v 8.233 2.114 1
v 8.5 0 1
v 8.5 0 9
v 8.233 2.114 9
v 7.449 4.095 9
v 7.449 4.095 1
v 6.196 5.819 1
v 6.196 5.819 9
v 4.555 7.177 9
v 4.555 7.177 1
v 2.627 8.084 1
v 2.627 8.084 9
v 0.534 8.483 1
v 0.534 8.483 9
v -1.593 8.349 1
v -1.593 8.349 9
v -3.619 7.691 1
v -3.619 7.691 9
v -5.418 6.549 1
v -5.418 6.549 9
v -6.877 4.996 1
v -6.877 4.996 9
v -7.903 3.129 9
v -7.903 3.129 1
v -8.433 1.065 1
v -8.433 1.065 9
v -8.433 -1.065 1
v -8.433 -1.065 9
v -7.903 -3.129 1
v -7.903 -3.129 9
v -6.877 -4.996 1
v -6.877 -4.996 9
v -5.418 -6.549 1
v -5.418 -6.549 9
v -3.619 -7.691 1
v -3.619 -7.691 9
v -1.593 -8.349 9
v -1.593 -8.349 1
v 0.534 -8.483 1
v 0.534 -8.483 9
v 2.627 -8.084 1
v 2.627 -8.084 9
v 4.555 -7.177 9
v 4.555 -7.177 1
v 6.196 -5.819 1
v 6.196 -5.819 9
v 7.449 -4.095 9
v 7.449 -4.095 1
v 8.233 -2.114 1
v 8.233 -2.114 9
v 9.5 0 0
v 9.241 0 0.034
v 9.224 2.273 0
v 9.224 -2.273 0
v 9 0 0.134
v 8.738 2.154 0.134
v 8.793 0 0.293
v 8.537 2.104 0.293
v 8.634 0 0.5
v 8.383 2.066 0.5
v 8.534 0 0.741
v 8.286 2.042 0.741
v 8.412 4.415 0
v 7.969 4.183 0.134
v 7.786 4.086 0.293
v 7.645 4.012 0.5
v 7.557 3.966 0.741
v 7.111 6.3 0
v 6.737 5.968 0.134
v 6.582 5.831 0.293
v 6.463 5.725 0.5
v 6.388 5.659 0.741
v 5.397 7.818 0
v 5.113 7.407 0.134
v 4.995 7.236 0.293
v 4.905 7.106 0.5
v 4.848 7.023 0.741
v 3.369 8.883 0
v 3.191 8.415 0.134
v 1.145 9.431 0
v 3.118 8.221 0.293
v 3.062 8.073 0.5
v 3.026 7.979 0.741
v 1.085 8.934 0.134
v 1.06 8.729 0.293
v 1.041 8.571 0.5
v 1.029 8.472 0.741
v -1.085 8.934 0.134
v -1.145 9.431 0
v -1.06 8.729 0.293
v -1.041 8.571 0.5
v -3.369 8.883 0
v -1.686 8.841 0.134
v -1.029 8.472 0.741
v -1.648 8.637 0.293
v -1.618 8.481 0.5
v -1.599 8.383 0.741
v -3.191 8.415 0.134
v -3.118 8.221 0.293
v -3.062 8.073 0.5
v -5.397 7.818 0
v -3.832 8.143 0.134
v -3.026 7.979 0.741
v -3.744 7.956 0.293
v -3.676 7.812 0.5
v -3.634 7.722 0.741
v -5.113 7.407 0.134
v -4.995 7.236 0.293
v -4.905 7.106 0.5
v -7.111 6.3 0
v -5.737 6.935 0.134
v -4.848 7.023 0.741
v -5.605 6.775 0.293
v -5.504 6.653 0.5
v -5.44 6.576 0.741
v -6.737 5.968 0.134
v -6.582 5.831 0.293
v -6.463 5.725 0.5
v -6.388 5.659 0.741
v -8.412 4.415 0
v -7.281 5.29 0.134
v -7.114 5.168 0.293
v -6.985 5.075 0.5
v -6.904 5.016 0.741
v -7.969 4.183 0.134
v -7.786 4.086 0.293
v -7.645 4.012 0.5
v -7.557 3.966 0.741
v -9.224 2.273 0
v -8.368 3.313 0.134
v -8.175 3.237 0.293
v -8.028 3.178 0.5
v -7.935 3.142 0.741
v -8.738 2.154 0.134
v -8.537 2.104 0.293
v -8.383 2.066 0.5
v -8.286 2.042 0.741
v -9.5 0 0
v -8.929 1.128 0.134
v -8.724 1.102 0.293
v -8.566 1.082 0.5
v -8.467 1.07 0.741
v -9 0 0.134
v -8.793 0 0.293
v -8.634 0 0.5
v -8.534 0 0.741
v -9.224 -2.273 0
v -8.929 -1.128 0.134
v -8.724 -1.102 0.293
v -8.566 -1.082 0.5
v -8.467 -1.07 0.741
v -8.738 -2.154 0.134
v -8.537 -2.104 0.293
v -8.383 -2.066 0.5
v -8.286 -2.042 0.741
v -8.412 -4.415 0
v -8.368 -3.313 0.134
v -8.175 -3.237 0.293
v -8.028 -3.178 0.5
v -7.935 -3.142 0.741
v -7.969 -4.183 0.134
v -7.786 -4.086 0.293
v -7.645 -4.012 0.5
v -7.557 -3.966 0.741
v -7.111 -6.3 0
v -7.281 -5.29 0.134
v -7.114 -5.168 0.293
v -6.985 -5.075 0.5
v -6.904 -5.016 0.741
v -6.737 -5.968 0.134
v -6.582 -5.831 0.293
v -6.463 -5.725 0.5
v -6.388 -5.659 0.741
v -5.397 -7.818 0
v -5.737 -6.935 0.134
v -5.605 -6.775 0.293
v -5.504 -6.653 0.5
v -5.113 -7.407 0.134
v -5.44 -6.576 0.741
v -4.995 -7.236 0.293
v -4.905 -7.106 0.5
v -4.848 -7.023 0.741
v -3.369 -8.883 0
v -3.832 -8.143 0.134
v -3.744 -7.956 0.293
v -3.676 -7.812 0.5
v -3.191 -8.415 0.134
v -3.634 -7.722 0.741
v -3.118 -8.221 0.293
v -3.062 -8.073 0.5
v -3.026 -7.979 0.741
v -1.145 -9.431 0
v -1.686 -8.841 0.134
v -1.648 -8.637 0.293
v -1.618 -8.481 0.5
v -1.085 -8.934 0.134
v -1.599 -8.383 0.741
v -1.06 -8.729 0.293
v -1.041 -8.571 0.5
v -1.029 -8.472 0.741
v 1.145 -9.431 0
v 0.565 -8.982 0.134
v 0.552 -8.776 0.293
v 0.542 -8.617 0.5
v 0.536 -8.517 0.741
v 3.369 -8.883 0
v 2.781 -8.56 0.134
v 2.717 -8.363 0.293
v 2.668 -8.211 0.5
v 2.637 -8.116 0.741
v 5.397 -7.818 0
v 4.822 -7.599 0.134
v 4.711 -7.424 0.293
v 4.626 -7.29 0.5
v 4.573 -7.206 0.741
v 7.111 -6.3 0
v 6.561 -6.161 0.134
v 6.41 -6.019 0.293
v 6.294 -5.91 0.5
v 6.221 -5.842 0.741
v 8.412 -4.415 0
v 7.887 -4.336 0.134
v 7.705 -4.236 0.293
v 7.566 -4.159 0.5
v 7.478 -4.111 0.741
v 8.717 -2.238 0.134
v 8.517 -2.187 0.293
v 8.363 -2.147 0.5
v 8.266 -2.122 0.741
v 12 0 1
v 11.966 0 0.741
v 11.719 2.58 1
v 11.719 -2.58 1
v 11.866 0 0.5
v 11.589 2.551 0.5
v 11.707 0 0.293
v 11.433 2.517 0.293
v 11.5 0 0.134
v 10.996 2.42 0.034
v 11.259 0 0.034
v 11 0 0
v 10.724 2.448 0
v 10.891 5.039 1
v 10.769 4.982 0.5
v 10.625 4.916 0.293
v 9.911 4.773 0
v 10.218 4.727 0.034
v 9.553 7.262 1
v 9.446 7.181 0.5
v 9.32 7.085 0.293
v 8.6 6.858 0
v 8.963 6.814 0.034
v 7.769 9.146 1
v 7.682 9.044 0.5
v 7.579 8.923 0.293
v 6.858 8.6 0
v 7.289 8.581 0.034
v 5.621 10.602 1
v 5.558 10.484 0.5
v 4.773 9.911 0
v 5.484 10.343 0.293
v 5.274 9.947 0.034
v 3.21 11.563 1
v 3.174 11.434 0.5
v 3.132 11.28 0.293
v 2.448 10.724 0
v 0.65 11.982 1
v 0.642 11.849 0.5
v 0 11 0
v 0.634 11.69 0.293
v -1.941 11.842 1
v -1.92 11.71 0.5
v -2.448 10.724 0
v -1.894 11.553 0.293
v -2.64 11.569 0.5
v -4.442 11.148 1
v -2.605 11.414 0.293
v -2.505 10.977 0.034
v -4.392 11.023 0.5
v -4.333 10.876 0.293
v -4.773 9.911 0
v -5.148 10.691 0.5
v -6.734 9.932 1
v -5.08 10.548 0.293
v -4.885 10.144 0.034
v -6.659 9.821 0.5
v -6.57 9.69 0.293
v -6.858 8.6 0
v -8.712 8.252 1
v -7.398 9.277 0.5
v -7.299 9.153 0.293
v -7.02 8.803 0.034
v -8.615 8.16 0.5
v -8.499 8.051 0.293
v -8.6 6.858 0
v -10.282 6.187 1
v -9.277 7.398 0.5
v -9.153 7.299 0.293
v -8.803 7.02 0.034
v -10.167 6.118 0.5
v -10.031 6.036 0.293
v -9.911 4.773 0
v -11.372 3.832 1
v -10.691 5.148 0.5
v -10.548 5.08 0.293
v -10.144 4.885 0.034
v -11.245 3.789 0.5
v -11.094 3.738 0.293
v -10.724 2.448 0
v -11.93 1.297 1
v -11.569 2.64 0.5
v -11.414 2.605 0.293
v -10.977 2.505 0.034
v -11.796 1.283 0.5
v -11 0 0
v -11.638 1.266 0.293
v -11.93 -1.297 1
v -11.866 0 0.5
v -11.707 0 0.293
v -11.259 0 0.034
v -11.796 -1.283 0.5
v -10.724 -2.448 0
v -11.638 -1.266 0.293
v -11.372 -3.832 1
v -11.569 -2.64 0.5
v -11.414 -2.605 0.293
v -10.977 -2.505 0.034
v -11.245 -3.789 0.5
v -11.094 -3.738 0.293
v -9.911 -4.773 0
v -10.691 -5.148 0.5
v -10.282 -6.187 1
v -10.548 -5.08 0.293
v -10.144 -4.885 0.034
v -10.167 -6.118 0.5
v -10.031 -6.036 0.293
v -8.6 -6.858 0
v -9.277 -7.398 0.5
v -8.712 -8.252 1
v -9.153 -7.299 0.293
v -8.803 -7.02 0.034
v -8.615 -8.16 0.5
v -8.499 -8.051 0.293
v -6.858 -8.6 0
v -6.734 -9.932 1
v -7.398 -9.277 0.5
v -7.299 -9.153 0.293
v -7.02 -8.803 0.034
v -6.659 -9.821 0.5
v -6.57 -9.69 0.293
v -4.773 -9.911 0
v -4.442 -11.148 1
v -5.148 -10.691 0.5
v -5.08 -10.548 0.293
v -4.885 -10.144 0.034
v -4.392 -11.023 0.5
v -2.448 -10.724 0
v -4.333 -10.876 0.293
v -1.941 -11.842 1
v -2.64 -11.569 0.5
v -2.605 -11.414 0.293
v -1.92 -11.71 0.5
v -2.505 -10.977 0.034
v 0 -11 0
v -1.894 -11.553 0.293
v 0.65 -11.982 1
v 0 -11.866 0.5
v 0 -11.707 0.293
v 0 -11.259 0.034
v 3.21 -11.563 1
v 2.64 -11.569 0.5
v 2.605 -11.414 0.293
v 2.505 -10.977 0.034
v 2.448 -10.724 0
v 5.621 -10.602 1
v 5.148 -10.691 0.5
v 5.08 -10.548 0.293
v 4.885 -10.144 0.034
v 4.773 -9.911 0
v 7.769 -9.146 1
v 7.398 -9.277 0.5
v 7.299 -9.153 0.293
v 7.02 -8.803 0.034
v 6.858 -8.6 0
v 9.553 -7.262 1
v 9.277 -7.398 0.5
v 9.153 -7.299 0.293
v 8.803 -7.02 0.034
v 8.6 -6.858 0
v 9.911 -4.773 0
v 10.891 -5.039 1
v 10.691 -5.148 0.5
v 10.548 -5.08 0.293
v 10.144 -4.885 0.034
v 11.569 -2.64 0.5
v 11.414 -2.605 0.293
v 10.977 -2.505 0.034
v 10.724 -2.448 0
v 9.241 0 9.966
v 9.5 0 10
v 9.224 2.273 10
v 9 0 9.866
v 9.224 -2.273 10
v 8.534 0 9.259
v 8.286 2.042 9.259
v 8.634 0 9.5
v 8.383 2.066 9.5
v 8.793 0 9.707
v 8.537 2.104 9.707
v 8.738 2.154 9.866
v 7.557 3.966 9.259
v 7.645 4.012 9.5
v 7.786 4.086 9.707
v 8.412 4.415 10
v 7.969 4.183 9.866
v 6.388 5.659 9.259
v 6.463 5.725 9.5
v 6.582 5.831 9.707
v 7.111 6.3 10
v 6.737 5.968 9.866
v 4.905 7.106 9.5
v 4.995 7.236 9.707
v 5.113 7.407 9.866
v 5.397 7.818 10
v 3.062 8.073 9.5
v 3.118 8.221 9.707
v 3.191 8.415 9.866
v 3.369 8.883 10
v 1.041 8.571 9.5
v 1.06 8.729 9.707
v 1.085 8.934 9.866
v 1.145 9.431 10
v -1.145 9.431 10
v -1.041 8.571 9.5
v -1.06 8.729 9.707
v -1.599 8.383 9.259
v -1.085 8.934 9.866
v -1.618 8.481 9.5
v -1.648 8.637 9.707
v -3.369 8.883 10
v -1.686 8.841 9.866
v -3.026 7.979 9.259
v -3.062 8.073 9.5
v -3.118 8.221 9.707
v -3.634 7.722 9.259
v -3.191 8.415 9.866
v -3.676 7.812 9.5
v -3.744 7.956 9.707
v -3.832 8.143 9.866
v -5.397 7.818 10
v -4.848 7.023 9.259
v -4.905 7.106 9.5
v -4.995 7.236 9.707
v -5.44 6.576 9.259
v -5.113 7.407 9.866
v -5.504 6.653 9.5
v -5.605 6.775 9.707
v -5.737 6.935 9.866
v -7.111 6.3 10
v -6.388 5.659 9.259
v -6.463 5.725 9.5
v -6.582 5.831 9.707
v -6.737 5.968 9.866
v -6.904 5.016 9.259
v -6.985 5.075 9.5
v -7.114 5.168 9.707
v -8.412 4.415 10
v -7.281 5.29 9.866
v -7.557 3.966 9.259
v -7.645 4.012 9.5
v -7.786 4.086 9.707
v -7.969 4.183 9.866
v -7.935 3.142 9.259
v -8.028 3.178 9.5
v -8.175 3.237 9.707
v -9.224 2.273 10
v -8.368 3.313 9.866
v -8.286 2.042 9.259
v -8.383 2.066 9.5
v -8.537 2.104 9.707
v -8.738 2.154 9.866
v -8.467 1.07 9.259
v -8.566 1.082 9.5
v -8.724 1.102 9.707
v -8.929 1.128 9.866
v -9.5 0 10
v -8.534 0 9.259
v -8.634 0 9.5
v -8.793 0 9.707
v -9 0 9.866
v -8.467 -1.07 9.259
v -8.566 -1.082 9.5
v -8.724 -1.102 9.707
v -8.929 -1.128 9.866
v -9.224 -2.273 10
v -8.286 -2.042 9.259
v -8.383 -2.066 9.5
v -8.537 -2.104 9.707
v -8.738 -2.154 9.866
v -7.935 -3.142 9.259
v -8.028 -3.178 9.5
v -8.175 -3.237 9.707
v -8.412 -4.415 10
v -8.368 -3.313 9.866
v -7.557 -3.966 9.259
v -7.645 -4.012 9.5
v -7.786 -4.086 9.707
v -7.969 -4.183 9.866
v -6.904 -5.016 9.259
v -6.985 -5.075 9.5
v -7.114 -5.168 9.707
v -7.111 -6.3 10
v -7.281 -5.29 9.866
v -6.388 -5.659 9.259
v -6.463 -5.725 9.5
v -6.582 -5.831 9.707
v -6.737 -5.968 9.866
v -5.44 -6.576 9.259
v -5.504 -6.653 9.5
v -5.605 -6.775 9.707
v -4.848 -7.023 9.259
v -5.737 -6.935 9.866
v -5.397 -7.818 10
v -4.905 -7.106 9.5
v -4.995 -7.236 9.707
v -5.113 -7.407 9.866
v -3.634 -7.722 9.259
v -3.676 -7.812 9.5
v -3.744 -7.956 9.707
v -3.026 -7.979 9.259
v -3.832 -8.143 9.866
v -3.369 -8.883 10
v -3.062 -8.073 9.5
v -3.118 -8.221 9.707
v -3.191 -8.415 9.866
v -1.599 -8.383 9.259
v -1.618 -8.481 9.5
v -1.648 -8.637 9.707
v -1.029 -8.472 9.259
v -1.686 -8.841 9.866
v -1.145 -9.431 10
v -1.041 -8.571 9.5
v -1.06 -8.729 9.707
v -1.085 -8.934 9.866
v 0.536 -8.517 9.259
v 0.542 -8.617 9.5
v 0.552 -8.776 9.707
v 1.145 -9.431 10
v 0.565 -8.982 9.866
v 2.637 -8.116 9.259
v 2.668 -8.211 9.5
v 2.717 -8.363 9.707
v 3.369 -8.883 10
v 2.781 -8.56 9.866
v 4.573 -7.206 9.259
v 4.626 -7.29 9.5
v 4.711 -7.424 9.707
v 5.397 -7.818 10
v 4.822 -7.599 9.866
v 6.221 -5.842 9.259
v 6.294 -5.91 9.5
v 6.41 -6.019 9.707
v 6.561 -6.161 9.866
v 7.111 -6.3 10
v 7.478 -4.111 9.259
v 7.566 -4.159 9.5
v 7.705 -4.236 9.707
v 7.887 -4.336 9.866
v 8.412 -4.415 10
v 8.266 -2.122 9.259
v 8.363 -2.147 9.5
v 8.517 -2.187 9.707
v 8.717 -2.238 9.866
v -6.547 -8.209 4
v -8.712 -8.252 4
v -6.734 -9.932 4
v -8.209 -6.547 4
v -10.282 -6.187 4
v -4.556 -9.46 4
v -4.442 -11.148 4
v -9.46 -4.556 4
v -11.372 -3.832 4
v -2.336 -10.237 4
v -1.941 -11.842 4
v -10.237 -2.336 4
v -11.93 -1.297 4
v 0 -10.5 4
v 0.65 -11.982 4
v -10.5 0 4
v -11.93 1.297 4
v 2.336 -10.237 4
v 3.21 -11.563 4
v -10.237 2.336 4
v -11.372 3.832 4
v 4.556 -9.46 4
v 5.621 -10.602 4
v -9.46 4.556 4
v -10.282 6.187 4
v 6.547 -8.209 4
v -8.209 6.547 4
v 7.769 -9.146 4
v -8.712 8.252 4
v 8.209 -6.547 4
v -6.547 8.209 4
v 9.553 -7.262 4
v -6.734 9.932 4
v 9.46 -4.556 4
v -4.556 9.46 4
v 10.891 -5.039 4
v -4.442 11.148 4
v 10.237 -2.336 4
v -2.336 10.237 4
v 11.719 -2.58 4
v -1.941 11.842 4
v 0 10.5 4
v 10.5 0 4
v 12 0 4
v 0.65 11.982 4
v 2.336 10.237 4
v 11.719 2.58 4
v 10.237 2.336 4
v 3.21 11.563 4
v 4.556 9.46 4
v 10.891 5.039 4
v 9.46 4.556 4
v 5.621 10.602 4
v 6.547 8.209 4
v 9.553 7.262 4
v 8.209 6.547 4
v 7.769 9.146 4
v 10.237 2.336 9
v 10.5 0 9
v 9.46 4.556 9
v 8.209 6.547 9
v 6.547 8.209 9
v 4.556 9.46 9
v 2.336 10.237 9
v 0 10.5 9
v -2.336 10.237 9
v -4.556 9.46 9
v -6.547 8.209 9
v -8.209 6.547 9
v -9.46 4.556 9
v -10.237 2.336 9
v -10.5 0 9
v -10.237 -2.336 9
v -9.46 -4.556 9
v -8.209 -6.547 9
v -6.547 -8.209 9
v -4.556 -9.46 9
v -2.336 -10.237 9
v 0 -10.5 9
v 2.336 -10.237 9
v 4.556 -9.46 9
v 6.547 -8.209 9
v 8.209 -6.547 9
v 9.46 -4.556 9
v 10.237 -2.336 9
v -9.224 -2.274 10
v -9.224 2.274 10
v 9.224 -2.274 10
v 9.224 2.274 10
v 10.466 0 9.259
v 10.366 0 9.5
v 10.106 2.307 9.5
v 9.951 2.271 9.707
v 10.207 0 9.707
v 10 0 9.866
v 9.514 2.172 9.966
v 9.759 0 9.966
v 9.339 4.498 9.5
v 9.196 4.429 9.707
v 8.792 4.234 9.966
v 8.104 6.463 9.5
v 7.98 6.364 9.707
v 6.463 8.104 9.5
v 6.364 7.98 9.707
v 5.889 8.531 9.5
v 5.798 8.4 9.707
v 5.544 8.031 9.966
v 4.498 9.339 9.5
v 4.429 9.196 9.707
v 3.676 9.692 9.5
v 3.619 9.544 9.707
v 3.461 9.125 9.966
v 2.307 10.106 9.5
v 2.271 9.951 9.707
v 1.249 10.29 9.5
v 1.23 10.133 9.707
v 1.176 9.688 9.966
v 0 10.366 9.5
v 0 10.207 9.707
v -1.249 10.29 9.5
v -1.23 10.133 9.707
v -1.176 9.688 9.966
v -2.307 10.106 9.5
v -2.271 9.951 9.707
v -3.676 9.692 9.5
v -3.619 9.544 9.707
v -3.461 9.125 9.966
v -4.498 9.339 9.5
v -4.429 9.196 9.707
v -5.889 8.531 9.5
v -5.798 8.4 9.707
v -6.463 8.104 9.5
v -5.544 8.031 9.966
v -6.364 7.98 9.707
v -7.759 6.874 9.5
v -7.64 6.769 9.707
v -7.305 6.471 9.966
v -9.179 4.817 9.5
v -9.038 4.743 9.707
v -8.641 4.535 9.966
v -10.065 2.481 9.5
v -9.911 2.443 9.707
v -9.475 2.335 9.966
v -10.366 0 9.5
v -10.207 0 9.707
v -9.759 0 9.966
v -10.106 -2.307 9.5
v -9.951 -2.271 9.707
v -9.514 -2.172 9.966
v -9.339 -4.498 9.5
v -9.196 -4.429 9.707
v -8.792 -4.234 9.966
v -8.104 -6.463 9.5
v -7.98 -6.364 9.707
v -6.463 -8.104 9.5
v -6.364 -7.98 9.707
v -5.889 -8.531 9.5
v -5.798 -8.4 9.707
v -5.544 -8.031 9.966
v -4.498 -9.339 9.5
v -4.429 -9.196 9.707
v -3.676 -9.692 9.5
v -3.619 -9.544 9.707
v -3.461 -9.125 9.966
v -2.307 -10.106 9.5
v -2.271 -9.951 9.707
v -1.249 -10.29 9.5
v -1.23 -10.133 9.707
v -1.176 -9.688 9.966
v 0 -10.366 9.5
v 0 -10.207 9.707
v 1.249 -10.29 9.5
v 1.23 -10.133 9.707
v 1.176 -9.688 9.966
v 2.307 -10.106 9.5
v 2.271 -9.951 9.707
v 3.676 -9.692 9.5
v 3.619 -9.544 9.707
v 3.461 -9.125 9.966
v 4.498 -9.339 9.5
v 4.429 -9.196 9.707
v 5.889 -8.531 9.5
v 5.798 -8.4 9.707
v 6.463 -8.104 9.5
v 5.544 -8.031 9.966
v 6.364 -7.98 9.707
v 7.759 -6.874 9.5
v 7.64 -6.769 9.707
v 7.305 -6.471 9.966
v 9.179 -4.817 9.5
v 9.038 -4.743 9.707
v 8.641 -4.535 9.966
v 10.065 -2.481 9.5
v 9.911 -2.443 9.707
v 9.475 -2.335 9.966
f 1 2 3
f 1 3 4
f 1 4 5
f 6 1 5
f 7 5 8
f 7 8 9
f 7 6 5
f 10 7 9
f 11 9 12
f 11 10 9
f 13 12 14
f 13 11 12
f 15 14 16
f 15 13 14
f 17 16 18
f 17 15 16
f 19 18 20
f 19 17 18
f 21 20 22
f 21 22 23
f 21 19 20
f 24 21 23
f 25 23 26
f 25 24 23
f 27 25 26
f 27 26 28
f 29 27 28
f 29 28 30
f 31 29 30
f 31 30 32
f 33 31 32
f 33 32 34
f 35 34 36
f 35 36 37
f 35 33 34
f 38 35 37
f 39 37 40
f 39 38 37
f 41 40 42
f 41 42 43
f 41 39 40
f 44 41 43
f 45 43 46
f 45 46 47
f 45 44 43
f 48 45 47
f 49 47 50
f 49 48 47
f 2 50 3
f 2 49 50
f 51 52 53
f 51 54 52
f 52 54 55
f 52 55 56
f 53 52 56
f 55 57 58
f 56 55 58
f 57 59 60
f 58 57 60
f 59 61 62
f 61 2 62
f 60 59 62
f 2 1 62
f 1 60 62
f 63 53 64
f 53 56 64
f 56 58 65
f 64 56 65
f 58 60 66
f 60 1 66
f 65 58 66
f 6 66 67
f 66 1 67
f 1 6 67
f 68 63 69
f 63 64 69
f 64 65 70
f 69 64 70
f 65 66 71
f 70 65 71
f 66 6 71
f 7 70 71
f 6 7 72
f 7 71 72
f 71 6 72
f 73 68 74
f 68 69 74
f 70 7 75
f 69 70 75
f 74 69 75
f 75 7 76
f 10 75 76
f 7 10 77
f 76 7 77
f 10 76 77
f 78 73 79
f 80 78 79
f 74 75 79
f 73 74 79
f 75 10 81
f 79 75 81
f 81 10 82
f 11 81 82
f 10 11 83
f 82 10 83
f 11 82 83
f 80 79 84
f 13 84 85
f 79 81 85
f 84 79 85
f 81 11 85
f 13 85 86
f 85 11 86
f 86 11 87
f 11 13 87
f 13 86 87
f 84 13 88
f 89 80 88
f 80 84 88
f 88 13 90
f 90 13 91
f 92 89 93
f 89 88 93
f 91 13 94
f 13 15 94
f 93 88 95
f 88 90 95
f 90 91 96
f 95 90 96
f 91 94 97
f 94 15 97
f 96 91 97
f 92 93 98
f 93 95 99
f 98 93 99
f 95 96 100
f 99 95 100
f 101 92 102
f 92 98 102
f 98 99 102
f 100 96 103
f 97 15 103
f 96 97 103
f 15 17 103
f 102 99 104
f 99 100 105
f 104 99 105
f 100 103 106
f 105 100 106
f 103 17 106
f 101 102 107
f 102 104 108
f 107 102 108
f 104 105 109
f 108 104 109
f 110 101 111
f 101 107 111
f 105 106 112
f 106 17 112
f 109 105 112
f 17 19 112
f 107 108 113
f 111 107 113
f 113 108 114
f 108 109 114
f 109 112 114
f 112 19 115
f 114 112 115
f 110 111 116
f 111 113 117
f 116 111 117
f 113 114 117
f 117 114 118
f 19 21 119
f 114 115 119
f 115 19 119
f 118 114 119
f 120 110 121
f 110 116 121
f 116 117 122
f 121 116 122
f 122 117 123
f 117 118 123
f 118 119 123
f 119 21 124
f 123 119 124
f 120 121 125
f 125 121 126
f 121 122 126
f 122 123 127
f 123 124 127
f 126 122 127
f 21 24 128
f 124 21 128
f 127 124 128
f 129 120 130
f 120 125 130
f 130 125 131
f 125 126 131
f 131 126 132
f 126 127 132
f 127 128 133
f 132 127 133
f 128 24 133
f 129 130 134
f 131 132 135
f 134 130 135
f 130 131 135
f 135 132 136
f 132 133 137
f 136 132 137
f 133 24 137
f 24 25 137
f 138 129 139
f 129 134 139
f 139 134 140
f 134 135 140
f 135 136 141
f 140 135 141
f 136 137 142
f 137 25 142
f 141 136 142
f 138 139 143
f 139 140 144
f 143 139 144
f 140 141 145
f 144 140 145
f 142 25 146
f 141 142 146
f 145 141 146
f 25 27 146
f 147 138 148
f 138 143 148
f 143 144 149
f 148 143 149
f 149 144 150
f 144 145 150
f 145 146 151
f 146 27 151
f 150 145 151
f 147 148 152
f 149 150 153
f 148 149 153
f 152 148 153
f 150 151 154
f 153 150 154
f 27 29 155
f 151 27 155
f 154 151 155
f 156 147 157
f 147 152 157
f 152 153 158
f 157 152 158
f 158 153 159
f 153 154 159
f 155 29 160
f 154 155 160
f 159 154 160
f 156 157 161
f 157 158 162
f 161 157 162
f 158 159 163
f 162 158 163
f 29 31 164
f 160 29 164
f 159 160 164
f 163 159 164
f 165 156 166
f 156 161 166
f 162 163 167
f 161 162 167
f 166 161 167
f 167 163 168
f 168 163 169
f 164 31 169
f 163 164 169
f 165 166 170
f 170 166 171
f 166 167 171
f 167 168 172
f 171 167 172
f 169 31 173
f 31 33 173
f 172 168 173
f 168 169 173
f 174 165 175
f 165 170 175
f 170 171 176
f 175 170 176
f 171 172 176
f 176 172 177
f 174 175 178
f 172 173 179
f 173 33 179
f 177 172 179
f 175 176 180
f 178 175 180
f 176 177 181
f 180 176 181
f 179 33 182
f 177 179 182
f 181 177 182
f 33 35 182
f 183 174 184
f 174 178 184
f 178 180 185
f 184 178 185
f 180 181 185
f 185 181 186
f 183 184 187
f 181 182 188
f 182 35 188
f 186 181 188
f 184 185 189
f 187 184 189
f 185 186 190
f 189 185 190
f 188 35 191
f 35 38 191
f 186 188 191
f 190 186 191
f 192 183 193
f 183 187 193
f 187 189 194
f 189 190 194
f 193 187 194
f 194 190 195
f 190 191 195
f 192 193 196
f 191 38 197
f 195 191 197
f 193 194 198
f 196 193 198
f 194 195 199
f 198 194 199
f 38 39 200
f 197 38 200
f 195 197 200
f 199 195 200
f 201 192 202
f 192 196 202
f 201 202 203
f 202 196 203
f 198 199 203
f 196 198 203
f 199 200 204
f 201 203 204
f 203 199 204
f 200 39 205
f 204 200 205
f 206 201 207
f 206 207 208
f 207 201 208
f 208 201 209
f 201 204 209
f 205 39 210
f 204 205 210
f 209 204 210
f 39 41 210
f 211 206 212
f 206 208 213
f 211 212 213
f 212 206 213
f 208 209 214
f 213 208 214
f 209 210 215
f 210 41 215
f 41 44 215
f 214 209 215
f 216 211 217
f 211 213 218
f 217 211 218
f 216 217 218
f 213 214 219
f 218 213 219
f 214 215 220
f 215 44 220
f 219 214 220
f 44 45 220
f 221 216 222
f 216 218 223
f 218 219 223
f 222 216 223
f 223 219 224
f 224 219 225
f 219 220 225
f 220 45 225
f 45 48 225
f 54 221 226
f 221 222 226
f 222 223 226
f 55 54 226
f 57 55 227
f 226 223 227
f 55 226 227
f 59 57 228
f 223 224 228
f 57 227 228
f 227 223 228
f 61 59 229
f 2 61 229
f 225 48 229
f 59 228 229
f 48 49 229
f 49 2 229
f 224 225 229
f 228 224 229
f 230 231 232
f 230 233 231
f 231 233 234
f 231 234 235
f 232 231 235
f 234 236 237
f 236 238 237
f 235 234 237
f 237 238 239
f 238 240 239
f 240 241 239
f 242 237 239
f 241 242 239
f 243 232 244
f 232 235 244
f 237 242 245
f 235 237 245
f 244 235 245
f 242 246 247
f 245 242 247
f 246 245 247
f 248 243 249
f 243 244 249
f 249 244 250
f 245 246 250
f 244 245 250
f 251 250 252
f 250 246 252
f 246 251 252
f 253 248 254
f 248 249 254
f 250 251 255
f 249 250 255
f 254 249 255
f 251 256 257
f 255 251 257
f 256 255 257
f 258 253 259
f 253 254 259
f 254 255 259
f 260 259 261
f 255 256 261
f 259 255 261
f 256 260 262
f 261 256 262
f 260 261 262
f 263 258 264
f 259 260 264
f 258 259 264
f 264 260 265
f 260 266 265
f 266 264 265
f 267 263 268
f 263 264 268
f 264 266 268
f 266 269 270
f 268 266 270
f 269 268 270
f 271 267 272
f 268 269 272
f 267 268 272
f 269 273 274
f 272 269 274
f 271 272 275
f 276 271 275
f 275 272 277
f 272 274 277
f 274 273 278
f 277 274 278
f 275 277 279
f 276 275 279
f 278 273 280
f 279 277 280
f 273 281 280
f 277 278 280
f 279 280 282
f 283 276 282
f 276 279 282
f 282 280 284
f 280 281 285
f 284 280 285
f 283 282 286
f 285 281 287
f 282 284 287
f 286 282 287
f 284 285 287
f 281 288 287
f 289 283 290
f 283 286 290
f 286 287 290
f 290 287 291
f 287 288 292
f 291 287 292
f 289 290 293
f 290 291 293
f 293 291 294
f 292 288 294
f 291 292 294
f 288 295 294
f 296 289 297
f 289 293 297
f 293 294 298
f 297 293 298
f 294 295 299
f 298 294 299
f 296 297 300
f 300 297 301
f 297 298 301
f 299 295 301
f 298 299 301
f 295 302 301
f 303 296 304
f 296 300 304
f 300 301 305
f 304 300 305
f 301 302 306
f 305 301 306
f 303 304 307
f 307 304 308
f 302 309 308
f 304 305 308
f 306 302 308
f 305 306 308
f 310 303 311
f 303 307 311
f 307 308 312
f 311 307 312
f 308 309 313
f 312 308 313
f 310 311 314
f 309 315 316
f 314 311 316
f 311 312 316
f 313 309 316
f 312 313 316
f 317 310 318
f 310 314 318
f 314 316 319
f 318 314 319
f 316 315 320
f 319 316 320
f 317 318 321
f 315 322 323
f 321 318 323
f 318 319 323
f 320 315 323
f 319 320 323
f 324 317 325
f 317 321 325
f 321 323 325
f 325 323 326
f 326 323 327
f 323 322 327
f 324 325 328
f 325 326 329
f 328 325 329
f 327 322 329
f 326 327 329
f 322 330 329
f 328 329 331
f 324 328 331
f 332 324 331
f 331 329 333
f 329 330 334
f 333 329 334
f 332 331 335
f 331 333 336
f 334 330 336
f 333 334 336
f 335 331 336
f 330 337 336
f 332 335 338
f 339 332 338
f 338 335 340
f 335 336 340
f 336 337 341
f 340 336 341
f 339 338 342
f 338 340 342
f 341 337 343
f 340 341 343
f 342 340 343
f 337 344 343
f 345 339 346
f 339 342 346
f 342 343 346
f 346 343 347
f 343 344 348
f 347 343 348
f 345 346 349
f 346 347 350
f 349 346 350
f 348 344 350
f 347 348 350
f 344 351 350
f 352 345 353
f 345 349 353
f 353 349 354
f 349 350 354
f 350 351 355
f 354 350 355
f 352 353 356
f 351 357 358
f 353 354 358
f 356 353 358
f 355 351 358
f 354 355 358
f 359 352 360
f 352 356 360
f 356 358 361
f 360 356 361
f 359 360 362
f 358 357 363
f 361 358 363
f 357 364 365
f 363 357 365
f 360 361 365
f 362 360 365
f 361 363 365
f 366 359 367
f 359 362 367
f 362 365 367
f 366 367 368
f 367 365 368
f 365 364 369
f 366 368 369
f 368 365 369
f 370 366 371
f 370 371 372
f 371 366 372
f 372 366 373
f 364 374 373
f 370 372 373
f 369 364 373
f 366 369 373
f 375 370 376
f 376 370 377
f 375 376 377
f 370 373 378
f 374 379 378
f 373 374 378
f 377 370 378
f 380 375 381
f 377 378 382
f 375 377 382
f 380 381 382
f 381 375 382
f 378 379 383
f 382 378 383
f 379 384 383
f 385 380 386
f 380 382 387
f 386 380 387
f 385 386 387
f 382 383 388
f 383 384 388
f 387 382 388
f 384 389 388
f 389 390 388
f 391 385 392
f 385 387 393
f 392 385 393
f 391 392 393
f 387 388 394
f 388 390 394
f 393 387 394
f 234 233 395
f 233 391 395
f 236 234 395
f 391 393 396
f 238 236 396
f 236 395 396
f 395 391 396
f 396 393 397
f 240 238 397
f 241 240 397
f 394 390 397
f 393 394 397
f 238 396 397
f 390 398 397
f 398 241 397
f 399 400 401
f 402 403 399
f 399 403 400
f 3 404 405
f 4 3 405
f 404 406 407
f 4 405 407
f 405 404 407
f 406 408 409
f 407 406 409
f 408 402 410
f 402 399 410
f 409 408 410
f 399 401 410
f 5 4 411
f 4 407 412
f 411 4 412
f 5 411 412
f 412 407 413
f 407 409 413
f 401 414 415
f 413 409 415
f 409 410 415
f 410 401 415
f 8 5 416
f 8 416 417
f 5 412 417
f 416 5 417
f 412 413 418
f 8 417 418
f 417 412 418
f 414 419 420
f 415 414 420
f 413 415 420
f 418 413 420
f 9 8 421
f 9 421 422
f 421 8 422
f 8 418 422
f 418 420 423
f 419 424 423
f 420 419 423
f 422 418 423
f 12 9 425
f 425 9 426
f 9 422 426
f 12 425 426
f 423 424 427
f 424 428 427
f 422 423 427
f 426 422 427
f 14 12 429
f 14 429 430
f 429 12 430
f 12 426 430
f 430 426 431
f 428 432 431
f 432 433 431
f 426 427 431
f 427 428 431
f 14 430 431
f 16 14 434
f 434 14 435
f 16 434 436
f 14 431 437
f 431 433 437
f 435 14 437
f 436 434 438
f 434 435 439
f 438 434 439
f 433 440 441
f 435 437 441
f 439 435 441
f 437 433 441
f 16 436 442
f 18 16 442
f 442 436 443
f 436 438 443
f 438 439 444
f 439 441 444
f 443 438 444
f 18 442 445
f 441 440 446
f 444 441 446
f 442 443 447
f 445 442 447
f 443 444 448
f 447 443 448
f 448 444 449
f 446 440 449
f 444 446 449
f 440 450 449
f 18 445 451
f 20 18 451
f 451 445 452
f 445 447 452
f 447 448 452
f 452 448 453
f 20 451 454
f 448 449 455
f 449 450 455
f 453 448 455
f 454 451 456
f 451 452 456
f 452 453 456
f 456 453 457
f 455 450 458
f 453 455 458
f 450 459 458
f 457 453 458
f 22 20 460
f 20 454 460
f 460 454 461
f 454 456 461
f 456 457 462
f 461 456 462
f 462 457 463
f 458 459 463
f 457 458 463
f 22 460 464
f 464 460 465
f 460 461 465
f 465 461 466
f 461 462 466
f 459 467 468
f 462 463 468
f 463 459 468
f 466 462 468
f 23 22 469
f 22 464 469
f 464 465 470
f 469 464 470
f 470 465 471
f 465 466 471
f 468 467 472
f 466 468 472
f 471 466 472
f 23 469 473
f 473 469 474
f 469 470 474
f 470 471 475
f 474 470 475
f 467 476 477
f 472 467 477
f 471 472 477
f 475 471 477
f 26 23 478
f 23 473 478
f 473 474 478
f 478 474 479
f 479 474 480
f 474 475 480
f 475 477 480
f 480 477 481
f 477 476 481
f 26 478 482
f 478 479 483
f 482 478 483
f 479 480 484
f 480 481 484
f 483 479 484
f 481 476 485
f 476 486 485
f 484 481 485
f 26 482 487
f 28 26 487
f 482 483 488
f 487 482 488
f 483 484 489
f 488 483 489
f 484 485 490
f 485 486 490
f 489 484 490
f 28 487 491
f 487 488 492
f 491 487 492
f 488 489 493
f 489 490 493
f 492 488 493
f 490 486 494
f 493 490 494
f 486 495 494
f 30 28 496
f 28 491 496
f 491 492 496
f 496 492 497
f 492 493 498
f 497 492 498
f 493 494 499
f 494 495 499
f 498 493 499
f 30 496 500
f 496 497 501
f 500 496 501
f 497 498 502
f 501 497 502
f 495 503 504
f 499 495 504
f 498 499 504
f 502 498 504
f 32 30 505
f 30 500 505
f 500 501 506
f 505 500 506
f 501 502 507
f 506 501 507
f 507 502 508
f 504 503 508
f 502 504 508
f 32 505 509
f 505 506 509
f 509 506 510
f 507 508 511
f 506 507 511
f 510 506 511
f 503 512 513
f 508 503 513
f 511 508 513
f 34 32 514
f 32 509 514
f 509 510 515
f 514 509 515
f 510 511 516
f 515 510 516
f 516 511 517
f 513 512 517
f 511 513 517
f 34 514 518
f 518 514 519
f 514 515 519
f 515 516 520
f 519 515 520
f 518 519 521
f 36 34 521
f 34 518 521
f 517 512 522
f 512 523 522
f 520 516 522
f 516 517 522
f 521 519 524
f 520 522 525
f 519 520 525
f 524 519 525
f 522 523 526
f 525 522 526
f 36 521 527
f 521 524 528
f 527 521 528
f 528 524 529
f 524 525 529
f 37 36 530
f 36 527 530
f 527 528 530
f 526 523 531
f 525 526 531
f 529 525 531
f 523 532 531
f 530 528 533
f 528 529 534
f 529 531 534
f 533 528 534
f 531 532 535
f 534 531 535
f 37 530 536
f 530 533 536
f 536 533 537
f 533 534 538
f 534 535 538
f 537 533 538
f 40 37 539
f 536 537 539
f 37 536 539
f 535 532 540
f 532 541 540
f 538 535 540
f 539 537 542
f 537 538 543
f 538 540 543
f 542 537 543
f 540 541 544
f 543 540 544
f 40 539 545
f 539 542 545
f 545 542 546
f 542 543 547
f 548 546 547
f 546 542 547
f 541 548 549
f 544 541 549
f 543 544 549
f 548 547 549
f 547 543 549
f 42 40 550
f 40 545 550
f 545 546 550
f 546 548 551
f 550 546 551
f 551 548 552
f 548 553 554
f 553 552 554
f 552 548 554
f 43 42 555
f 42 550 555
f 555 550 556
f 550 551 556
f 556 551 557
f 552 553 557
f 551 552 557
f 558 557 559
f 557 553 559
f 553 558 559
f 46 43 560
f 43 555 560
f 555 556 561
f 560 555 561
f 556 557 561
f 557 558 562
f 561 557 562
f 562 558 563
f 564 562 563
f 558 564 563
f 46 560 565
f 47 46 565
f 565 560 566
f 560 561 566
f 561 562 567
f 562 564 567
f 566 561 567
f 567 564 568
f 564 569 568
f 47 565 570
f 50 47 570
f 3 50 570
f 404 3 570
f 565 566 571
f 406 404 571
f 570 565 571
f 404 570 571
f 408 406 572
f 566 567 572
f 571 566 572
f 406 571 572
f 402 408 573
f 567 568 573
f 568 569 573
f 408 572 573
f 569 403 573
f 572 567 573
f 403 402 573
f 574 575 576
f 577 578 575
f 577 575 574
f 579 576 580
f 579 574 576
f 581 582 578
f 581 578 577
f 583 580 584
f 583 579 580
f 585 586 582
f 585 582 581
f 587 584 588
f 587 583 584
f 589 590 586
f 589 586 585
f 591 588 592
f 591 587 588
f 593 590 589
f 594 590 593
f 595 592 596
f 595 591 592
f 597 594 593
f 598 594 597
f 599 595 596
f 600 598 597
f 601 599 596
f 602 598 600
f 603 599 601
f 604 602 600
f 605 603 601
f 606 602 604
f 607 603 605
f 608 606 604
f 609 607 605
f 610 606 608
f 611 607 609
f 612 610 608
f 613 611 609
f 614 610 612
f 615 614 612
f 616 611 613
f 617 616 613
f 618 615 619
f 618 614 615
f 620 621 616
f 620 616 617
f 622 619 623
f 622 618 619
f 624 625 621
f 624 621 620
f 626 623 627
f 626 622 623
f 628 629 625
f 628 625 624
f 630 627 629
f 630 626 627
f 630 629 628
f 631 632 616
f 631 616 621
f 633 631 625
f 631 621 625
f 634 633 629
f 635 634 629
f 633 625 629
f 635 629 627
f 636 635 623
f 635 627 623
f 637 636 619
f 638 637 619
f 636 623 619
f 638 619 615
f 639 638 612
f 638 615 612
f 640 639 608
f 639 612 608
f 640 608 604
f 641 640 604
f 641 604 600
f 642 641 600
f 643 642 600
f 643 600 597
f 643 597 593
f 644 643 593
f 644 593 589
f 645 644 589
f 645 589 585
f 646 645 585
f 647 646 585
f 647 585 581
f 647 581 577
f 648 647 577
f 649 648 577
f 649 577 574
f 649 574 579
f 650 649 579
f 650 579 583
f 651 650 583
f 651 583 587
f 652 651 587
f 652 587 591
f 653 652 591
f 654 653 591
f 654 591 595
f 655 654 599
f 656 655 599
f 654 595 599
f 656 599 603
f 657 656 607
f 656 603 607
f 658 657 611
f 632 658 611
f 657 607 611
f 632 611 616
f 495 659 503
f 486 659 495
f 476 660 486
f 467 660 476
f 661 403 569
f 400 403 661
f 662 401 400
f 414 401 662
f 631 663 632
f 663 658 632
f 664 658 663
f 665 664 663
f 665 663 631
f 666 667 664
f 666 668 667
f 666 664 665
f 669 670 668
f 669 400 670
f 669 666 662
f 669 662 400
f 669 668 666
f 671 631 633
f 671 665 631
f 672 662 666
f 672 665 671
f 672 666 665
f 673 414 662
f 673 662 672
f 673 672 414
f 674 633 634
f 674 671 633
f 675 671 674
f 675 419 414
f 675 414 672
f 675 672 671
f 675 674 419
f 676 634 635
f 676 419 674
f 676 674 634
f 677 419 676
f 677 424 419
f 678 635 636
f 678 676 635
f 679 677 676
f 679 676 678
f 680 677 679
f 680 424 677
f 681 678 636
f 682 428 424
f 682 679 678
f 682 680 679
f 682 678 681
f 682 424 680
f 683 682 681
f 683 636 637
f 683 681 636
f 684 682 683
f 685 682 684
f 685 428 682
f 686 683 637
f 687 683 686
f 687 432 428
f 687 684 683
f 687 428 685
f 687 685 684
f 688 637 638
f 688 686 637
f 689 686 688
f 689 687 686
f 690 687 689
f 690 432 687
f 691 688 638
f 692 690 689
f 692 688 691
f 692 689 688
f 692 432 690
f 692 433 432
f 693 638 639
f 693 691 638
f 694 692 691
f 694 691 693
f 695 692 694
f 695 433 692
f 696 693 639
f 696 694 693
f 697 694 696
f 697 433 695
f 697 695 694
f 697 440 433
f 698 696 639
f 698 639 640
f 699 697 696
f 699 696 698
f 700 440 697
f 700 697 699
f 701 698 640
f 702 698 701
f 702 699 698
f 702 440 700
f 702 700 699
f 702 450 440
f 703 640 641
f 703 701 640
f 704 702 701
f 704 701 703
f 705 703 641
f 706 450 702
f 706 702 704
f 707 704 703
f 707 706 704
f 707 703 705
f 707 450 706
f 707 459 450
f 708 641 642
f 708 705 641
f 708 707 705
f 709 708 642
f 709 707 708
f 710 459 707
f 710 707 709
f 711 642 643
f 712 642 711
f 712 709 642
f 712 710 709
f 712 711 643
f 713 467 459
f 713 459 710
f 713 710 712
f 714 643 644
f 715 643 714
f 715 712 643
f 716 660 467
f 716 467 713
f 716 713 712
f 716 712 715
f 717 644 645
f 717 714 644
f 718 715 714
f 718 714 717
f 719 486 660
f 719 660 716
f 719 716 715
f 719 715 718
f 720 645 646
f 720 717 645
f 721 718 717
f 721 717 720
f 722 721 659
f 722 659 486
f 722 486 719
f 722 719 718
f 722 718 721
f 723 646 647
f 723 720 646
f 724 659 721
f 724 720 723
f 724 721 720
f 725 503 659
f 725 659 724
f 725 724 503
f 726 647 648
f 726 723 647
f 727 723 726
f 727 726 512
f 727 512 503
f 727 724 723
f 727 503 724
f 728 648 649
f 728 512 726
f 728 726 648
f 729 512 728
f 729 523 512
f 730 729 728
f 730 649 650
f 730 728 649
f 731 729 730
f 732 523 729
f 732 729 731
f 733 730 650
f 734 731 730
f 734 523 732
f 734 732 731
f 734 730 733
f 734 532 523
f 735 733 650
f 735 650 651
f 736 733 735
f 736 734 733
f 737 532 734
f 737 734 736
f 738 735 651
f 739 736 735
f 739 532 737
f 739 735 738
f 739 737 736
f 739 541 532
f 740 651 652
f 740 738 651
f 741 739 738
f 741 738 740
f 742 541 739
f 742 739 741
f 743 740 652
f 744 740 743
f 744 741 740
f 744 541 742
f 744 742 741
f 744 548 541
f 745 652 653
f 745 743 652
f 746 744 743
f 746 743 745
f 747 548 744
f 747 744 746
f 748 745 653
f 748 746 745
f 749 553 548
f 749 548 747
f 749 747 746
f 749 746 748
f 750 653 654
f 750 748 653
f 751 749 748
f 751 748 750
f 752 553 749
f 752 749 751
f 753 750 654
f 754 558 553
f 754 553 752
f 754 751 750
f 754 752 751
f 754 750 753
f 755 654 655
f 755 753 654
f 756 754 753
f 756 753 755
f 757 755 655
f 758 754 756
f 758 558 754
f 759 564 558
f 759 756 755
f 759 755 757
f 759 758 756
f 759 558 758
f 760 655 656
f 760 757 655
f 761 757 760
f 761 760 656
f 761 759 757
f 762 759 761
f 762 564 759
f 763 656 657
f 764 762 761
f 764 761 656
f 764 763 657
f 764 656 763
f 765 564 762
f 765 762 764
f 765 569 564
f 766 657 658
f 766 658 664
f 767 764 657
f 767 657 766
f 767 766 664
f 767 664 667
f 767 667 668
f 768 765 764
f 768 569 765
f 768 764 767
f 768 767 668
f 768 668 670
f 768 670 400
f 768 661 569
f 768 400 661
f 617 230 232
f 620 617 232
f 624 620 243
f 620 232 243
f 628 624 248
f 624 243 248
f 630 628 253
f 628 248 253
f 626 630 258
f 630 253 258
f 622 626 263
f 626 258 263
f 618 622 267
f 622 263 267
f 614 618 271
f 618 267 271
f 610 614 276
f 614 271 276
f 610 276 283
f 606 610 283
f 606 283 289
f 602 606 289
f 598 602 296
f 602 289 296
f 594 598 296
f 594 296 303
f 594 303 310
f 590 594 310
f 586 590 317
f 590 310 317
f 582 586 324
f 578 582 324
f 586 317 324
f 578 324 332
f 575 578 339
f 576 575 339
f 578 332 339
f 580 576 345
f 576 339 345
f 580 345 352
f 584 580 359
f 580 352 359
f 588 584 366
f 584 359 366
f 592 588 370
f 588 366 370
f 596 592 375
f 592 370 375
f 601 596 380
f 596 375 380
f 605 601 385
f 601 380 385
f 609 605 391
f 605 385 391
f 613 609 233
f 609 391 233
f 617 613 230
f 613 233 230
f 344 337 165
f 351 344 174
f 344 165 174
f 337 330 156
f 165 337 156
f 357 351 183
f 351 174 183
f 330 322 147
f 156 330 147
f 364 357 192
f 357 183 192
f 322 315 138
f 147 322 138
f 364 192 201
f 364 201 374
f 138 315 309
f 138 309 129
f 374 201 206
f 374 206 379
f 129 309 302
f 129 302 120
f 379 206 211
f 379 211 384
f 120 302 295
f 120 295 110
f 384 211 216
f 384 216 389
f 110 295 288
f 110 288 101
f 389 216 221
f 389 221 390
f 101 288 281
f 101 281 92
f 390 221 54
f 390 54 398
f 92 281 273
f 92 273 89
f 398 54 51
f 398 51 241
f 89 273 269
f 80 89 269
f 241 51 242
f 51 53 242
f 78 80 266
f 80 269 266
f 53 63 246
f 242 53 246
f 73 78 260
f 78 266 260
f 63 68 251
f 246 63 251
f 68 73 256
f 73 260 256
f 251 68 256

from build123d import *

# Parameters (mm, degrees)
F0_R     = 10.5
F0_R_2   = 8.5
F1_DEPTH = 10
F0_R_3   = 12
F2_DEPTH = 4
F3_R     = 0.99999


# Not quite as in the source:
# - a fillet or chamfer is up to 0.001 mm smaller than in the source, because OpenCascade refuses the exact size


with BuildPart() as f1:
    # F0 (on Top) → F1 (new body)
    with BuildSketch(Plane.XY):
        Circle(F0_R)
        Circle(F0_R_2, mode=Mode.SUBTRACT)
    extrude(amount=F1_DEPTH)

    # F0 (on Top) → F2 (join)
    with BuildSketch(Plane.XY):
        Circle(F0_R_3)
        Circle(F0_R, mode=Mode.SUBTRACT)
    extrude(amount=F2_DEPTH)

    # F3 (radius 1 in the source; OpenCascade refuses exactly that, so slightly less here)
    f3_edges = [f1.edges().sort_by_distance(p)[0] for p in [
        (-8.5, 0, 0),
        (-12, 0, 0),
        (-8.5, 0, 10),
        (-10.5, 0, 10),
    ]]
    fillet(f3_edges, radius=F3_R)


solid = f1.part
